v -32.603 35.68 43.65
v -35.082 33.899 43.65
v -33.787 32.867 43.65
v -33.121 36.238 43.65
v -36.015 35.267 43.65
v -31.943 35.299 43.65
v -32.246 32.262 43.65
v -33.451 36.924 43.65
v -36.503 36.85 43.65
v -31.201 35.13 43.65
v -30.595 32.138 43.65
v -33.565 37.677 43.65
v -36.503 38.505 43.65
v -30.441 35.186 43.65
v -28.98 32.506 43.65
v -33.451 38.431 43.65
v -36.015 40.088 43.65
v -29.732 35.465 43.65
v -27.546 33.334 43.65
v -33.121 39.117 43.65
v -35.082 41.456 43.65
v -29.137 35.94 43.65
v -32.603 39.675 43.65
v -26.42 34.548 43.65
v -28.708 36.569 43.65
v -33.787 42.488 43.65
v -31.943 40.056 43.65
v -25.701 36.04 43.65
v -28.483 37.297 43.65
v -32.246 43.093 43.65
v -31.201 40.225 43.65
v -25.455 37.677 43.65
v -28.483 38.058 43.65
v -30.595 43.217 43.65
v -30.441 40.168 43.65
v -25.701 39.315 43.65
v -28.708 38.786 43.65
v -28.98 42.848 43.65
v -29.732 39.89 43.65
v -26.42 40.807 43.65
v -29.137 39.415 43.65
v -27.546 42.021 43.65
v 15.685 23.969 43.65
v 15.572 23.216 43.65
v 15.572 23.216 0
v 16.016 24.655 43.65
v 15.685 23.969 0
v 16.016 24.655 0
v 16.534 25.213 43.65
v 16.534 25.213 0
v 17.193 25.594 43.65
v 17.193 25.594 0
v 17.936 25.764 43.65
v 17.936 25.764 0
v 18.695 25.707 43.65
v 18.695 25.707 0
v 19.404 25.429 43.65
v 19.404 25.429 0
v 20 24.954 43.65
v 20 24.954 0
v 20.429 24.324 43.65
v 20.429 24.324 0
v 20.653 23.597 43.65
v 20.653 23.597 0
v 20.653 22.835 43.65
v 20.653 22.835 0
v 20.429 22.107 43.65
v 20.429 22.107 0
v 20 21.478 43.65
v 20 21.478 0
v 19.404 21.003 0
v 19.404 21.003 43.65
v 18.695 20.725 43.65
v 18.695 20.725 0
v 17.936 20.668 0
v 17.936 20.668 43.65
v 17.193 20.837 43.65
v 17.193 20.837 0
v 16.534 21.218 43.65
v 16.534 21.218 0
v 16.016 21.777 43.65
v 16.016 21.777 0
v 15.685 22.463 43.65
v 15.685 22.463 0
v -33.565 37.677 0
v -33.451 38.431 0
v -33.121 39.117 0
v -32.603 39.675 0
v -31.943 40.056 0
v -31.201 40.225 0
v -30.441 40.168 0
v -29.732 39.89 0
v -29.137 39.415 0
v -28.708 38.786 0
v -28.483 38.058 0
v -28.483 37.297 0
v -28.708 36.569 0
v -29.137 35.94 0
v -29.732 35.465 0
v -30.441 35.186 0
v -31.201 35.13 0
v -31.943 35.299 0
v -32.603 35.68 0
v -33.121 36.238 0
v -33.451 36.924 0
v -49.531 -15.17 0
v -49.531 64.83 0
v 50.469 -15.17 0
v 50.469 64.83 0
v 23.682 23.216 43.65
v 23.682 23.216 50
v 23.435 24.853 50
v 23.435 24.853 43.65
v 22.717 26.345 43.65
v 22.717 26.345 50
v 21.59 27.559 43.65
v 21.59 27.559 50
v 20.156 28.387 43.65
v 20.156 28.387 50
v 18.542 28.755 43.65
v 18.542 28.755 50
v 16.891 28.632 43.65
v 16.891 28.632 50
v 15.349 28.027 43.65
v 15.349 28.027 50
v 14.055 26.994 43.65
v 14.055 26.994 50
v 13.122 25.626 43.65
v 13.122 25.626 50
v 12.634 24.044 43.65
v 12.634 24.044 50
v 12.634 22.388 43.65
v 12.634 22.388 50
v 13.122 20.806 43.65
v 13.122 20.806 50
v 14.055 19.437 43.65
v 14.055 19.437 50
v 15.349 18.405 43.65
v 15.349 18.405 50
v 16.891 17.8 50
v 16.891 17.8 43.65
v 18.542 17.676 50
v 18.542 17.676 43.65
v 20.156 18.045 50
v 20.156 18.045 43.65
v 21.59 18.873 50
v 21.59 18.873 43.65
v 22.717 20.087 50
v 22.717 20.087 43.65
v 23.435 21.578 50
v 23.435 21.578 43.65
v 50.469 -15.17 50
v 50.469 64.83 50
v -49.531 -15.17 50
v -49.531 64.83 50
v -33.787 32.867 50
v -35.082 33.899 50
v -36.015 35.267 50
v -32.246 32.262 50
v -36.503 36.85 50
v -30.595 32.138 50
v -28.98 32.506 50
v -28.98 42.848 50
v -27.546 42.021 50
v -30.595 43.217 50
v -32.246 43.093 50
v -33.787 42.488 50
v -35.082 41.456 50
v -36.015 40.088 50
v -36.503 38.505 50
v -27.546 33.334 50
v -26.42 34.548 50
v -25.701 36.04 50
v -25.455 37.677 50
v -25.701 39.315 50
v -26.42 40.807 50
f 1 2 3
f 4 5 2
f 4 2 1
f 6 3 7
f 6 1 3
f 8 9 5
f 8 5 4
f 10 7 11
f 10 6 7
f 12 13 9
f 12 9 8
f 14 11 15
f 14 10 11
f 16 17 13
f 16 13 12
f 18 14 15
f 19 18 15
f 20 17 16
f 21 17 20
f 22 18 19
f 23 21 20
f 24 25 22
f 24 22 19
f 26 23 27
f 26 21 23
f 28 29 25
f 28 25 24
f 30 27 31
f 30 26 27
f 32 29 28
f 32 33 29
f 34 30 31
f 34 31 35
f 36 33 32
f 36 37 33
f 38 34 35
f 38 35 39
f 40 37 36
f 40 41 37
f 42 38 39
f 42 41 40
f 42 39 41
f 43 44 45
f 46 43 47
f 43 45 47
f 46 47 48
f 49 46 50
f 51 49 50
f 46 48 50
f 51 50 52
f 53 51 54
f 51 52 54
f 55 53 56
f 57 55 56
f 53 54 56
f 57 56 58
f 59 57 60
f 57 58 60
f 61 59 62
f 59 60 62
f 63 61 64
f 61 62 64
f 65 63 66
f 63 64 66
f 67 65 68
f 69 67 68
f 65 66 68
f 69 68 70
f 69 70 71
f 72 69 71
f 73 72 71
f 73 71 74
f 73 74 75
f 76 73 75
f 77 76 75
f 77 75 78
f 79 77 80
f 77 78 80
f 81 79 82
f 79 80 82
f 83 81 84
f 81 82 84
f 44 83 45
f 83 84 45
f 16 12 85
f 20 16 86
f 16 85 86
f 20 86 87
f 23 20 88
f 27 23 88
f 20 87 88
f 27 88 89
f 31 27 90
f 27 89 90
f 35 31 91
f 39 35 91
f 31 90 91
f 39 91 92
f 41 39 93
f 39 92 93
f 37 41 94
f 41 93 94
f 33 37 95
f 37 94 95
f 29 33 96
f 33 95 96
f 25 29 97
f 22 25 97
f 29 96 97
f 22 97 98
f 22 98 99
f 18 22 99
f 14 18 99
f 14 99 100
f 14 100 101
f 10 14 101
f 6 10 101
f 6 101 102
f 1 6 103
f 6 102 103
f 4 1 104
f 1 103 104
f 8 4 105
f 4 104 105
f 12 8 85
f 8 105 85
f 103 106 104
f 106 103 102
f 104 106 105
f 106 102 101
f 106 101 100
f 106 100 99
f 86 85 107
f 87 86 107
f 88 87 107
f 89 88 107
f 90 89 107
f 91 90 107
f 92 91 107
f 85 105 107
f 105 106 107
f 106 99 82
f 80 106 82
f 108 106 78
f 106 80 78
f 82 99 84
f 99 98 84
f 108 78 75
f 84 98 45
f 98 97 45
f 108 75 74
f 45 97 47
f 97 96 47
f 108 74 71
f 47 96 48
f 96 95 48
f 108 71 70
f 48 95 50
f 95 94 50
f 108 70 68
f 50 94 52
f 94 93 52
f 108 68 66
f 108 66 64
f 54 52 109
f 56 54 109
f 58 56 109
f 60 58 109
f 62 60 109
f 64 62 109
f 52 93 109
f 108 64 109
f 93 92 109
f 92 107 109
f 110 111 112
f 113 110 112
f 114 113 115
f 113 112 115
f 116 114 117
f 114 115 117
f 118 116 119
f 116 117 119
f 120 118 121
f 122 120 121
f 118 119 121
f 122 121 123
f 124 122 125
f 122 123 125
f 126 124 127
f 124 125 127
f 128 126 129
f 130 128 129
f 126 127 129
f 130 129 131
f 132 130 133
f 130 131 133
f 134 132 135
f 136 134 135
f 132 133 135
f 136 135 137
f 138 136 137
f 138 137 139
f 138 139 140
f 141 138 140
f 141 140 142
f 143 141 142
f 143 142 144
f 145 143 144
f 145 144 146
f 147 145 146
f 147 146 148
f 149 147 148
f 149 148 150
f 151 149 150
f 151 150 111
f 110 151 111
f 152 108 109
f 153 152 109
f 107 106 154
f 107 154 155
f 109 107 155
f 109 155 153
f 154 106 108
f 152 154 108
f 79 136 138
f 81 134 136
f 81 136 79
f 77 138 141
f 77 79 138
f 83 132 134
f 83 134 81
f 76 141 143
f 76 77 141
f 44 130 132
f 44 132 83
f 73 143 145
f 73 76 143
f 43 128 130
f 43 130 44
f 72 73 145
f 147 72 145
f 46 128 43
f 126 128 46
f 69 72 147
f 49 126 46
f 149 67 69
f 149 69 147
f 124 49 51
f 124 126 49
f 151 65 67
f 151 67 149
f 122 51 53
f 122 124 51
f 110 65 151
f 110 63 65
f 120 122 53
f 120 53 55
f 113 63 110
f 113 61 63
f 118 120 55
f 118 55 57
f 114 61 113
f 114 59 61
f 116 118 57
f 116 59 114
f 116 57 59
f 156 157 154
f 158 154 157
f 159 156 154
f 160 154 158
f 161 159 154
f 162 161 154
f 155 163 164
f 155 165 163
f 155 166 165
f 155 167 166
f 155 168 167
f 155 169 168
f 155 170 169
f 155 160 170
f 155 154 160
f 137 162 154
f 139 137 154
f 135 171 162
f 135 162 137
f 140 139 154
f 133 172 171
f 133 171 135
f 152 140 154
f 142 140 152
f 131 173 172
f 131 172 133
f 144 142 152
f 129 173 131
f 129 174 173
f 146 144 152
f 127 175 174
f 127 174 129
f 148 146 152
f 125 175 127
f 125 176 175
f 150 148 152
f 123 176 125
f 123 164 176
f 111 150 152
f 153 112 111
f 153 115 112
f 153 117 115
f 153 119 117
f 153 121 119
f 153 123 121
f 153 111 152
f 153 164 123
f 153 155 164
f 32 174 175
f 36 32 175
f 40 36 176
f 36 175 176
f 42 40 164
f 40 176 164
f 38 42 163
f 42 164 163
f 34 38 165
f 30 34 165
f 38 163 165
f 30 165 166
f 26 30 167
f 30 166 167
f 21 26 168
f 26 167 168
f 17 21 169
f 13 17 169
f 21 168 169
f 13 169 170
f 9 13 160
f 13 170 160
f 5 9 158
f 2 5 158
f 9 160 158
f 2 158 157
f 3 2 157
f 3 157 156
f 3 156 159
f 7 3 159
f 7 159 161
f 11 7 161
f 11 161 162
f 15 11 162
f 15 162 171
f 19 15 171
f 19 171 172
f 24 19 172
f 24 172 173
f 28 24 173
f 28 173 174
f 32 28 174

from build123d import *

# Parameters (mm, degrees)
F0_W           = 100
F0_H           = 80
F1_DEPTH       = 50
F3_D           = 5.11
F3_CBORE_D     = 11.11
F3_CBORE_DEPTH = 6.35


with BuildPart() as f1:
    # F0 (on Top) → F1 (new body)
    with BuildSketch(Plane.XY):
        with Locations((0.469463, 24.830001)):
            Rectangle(F0_W, F0_H)
    extrude(amount=F1_DEPTH)

    # F3 (through all)
    with Locations(Plane.XY.offset(50)):
        with Locations((-31.00967, 37.677433), (18.126821, 23.215853)):
            CounterBoreHole(F3_D / 2, F3_CBORE_D / 2, F3_CBORE_DEPTH)


solid = f1.part
